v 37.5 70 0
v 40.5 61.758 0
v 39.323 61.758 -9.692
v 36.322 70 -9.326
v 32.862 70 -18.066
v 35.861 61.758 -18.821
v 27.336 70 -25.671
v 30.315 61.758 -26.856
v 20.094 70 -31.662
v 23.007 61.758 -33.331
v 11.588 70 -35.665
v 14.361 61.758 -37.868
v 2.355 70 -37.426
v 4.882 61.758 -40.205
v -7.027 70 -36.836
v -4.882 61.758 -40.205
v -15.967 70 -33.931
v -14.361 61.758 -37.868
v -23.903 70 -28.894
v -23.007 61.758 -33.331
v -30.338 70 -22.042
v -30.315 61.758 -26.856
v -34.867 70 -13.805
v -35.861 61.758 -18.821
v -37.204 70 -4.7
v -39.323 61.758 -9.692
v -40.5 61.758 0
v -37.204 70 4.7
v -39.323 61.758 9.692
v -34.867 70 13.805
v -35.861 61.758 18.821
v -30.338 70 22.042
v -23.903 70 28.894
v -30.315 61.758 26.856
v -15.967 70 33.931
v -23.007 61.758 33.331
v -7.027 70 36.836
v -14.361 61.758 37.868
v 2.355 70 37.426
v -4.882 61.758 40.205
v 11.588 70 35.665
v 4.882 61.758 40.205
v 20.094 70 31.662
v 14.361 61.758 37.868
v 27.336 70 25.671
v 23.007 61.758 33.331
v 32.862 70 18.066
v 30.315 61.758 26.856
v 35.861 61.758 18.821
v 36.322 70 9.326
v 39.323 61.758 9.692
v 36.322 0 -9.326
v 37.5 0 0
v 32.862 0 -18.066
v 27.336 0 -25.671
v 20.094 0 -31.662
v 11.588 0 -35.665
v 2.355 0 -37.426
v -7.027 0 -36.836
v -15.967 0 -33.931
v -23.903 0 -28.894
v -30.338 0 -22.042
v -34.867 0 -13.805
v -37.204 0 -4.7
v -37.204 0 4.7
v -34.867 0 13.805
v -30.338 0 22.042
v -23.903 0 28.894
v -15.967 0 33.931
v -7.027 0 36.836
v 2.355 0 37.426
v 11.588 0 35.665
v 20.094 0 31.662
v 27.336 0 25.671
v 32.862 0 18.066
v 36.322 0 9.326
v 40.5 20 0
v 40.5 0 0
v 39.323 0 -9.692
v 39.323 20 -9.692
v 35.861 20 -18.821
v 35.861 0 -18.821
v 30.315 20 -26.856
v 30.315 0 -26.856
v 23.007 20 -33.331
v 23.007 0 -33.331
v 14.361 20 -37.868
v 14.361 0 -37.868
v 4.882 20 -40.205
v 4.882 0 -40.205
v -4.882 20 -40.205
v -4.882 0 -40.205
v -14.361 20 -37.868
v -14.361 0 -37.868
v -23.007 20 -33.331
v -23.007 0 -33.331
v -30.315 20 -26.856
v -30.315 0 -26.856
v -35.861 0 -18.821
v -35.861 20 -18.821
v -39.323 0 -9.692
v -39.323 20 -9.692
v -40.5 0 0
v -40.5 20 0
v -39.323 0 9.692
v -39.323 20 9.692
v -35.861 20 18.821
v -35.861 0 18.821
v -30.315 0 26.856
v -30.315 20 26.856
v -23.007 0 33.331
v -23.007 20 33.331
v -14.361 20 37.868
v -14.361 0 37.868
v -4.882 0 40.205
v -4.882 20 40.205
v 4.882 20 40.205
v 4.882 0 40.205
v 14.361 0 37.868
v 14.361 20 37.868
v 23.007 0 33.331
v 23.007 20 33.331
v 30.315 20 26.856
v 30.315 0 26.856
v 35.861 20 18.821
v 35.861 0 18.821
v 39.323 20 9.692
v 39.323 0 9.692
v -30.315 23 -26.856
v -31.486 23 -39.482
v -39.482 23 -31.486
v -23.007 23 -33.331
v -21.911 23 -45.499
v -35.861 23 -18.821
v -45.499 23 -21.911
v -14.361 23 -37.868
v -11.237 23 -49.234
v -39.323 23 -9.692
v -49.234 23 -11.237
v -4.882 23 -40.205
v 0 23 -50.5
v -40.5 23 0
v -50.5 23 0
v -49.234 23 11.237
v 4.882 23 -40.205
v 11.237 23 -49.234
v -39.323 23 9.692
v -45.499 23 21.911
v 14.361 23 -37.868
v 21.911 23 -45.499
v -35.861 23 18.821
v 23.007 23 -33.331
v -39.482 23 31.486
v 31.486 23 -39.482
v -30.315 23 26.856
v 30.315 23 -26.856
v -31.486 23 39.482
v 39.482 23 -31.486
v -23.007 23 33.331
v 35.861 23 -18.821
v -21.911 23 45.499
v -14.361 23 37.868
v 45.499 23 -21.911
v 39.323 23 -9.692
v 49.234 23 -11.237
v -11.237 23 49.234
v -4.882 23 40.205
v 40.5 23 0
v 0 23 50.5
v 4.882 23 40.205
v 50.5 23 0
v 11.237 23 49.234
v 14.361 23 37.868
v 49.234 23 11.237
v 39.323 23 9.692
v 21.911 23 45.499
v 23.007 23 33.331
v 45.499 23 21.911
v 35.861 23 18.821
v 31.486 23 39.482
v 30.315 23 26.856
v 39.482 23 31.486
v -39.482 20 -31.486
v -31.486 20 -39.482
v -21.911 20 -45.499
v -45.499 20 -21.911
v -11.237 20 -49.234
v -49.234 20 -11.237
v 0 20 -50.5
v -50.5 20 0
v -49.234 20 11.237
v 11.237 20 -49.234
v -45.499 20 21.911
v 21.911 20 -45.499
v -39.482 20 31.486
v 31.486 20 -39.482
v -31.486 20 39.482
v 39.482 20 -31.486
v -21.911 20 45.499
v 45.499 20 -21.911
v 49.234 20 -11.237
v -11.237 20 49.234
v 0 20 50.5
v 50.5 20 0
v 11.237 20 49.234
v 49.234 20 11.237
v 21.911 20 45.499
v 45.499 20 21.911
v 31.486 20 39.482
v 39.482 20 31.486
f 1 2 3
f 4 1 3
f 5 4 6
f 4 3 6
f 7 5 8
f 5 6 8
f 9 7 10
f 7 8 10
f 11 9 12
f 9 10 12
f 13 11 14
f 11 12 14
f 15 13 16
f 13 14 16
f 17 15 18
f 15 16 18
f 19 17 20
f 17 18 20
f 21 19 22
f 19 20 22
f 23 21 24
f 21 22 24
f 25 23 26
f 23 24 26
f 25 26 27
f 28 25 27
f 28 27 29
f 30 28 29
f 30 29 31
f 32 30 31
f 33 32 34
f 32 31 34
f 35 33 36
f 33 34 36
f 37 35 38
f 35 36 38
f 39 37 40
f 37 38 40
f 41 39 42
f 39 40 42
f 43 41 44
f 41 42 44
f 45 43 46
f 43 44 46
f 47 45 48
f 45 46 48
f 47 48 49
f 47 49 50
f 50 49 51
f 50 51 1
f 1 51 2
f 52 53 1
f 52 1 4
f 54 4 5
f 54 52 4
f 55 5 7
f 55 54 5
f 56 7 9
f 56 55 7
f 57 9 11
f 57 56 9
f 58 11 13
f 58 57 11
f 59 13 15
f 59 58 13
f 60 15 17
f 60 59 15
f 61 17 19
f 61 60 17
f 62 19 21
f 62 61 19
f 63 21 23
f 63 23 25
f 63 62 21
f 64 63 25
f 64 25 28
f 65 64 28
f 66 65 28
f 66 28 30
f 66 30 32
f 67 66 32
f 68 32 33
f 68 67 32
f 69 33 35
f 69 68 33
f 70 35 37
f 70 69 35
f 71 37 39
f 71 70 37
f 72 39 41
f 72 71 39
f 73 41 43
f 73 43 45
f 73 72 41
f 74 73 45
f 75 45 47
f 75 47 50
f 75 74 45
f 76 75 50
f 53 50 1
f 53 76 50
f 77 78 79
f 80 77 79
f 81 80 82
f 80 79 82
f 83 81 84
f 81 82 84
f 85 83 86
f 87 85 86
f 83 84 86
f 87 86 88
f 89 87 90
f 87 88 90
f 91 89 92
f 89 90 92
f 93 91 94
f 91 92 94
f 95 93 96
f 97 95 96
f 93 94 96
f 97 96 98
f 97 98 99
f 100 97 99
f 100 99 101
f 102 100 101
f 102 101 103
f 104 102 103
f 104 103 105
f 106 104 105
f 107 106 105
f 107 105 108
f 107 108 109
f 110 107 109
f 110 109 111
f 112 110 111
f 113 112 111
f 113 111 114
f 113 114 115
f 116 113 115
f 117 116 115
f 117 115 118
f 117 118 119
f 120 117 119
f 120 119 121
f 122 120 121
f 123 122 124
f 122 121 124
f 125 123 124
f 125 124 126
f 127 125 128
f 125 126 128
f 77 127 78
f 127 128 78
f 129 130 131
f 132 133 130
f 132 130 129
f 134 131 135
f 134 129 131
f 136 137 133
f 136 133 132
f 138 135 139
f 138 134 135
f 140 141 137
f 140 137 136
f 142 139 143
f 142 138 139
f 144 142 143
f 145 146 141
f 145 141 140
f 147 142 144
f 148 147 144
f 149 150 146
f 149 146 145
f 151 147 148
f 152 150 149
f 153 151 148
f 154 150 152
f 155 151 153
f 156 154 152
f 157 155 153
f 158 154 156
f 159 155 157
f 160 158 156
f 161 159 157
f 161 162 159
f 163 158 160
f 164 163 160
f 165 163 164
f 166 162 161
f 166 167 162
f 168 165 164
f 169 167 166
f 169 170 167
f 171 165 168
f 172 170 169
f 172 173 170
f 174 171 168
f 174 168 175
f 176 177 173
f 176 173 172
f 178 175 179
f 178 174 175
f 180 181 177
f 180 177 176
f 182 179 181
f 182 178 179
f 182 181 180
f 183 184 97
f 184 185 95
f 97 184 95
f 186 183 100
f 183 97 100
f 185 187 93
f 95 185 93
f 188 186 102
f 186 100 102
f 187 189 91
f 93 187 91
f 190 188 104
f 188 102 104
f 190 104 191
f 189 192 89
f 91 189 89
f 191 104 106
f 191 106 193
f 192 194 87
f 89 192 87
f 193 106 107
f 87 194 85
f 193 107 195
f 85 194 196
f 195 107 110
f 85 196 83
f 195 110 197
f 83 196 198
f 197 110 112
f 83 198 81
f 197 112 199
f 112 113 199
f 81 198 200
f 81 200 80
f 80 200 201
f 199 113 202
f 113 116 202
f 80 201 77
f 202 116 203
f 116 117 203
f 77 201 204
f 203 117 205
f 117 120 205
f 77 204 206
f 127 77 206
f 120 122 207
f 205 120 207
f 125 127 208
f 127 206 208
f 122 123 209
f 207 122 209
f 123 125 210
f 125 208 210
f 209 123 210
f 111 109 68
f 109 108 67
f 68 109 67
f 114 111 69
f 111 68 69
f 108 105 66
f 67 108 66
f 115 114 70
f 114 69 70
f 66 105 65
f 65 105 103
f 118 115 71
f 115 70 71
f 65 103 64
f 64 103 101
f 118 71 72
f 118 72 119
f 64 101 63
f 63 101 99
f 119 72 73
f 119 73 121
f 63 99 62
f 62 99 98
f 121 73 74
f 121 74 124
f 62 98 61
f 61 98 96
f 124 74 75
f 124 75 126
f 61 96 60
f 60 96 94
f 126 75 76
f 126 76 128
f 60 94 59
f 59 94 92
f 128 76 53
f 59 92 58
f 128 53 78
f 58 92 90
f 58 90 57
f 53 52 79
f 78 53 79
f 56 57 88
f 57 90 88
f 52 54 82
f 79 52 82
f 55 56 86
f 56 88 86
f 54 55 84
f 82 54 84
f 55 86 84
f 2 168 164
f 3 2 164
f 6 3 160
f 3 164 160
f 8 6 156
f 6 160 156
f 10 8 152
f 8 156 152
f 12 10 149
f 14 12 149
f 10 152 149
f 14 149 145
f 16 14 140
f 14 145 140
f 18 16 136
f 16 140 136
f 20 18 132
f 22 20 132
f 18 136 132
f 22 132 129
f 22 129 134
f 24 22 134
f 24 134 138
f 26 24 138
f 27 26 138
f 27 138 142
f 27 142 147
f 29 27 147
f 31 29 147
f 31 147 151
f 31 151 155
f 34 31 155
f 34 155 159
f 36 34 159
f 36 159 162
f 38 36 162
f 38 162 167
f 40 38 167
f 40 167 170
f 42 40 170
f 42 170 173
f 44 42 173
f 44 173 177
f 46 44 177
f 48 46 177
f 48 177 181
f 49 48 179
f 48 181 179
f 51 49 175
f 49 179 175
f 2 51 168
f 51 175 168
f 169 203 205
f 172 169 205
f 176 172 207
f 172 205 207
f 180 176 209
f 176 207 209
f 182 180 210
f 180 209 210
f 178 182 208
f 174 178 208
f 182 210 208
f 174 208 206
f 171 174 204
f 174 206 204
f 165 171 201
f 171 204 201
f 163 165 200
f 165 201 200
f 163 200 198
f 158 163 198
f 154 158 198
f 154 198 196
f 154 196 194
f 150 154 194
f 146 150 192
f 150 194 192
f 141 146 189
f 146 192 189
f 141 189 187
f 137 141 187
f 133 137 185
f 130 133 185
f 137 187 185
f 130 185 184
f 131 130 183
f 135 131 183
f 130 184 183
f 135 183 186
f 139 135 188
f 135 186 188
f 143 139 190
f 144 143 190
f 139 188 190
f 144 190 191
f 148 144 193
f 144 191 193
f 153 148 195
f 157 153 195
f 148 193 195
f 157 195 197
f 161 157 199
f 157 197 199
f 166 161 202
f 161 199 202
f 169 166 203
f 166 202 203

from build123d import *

# Parameters (mm, degrees)
SKETCH_1_R        = 40.5
SKETCH_1_R_2      = 37.5
EXTRUDE_1_DEPTH   = 70
SKETCH_3_R        = 50.5
SKETCH_3_R_2      = 40.5
EXTRUDE_1_2_DEPTH = 3


# Read off the part's stored shape, not the designer's step: Вырез-Повернуть-Тонкостенный1
with BuildPart() as part:
    # Эскиз1 → Extrude 1 (new body)
    with BuildSketch(Plane(origin=(0, 0, 0), x_dir=(1, 0, 0), z_dir=(0, 1, 0))):
        Circle(SKETCH_1_R)
        Circle(SKETCH_1_R_2, mode=Mode.SUBTRACT)
    extrude(amount=EXTRUDE_1_DEPTH)

    # Вырез-Повернуть-Тонкостенный1 outline → Вырез-Повернуть-Тонкостенный1 (revolve, cut)
    with BuildSketch(Plane.XY):
        Polygon((40.5, 70), (37.5, 70), (40.5, 61.757567742), align=None)
    revolve(axis=Axis((0, 0, 0), (0, 1, 0)), mode=Mode.SUBTRACT)

    # Эскиз3 → Extrude 1 2 (add)
    with BuildSketch(Plane(origin=(0, 20, 0), x_dir=(1, 0, 0), z_dir=(0, 1, 0))):
        with Locations(Location((0, 0, 0), (0, 0, 270))):
            Circle(SKETCH_3_R)
        Circle(SKETCH_3_R_2, mode=Mode.SUBTRACT)
    extrude(amount=EXTRUDE_1_2_DEPTH)


solid = part.part
